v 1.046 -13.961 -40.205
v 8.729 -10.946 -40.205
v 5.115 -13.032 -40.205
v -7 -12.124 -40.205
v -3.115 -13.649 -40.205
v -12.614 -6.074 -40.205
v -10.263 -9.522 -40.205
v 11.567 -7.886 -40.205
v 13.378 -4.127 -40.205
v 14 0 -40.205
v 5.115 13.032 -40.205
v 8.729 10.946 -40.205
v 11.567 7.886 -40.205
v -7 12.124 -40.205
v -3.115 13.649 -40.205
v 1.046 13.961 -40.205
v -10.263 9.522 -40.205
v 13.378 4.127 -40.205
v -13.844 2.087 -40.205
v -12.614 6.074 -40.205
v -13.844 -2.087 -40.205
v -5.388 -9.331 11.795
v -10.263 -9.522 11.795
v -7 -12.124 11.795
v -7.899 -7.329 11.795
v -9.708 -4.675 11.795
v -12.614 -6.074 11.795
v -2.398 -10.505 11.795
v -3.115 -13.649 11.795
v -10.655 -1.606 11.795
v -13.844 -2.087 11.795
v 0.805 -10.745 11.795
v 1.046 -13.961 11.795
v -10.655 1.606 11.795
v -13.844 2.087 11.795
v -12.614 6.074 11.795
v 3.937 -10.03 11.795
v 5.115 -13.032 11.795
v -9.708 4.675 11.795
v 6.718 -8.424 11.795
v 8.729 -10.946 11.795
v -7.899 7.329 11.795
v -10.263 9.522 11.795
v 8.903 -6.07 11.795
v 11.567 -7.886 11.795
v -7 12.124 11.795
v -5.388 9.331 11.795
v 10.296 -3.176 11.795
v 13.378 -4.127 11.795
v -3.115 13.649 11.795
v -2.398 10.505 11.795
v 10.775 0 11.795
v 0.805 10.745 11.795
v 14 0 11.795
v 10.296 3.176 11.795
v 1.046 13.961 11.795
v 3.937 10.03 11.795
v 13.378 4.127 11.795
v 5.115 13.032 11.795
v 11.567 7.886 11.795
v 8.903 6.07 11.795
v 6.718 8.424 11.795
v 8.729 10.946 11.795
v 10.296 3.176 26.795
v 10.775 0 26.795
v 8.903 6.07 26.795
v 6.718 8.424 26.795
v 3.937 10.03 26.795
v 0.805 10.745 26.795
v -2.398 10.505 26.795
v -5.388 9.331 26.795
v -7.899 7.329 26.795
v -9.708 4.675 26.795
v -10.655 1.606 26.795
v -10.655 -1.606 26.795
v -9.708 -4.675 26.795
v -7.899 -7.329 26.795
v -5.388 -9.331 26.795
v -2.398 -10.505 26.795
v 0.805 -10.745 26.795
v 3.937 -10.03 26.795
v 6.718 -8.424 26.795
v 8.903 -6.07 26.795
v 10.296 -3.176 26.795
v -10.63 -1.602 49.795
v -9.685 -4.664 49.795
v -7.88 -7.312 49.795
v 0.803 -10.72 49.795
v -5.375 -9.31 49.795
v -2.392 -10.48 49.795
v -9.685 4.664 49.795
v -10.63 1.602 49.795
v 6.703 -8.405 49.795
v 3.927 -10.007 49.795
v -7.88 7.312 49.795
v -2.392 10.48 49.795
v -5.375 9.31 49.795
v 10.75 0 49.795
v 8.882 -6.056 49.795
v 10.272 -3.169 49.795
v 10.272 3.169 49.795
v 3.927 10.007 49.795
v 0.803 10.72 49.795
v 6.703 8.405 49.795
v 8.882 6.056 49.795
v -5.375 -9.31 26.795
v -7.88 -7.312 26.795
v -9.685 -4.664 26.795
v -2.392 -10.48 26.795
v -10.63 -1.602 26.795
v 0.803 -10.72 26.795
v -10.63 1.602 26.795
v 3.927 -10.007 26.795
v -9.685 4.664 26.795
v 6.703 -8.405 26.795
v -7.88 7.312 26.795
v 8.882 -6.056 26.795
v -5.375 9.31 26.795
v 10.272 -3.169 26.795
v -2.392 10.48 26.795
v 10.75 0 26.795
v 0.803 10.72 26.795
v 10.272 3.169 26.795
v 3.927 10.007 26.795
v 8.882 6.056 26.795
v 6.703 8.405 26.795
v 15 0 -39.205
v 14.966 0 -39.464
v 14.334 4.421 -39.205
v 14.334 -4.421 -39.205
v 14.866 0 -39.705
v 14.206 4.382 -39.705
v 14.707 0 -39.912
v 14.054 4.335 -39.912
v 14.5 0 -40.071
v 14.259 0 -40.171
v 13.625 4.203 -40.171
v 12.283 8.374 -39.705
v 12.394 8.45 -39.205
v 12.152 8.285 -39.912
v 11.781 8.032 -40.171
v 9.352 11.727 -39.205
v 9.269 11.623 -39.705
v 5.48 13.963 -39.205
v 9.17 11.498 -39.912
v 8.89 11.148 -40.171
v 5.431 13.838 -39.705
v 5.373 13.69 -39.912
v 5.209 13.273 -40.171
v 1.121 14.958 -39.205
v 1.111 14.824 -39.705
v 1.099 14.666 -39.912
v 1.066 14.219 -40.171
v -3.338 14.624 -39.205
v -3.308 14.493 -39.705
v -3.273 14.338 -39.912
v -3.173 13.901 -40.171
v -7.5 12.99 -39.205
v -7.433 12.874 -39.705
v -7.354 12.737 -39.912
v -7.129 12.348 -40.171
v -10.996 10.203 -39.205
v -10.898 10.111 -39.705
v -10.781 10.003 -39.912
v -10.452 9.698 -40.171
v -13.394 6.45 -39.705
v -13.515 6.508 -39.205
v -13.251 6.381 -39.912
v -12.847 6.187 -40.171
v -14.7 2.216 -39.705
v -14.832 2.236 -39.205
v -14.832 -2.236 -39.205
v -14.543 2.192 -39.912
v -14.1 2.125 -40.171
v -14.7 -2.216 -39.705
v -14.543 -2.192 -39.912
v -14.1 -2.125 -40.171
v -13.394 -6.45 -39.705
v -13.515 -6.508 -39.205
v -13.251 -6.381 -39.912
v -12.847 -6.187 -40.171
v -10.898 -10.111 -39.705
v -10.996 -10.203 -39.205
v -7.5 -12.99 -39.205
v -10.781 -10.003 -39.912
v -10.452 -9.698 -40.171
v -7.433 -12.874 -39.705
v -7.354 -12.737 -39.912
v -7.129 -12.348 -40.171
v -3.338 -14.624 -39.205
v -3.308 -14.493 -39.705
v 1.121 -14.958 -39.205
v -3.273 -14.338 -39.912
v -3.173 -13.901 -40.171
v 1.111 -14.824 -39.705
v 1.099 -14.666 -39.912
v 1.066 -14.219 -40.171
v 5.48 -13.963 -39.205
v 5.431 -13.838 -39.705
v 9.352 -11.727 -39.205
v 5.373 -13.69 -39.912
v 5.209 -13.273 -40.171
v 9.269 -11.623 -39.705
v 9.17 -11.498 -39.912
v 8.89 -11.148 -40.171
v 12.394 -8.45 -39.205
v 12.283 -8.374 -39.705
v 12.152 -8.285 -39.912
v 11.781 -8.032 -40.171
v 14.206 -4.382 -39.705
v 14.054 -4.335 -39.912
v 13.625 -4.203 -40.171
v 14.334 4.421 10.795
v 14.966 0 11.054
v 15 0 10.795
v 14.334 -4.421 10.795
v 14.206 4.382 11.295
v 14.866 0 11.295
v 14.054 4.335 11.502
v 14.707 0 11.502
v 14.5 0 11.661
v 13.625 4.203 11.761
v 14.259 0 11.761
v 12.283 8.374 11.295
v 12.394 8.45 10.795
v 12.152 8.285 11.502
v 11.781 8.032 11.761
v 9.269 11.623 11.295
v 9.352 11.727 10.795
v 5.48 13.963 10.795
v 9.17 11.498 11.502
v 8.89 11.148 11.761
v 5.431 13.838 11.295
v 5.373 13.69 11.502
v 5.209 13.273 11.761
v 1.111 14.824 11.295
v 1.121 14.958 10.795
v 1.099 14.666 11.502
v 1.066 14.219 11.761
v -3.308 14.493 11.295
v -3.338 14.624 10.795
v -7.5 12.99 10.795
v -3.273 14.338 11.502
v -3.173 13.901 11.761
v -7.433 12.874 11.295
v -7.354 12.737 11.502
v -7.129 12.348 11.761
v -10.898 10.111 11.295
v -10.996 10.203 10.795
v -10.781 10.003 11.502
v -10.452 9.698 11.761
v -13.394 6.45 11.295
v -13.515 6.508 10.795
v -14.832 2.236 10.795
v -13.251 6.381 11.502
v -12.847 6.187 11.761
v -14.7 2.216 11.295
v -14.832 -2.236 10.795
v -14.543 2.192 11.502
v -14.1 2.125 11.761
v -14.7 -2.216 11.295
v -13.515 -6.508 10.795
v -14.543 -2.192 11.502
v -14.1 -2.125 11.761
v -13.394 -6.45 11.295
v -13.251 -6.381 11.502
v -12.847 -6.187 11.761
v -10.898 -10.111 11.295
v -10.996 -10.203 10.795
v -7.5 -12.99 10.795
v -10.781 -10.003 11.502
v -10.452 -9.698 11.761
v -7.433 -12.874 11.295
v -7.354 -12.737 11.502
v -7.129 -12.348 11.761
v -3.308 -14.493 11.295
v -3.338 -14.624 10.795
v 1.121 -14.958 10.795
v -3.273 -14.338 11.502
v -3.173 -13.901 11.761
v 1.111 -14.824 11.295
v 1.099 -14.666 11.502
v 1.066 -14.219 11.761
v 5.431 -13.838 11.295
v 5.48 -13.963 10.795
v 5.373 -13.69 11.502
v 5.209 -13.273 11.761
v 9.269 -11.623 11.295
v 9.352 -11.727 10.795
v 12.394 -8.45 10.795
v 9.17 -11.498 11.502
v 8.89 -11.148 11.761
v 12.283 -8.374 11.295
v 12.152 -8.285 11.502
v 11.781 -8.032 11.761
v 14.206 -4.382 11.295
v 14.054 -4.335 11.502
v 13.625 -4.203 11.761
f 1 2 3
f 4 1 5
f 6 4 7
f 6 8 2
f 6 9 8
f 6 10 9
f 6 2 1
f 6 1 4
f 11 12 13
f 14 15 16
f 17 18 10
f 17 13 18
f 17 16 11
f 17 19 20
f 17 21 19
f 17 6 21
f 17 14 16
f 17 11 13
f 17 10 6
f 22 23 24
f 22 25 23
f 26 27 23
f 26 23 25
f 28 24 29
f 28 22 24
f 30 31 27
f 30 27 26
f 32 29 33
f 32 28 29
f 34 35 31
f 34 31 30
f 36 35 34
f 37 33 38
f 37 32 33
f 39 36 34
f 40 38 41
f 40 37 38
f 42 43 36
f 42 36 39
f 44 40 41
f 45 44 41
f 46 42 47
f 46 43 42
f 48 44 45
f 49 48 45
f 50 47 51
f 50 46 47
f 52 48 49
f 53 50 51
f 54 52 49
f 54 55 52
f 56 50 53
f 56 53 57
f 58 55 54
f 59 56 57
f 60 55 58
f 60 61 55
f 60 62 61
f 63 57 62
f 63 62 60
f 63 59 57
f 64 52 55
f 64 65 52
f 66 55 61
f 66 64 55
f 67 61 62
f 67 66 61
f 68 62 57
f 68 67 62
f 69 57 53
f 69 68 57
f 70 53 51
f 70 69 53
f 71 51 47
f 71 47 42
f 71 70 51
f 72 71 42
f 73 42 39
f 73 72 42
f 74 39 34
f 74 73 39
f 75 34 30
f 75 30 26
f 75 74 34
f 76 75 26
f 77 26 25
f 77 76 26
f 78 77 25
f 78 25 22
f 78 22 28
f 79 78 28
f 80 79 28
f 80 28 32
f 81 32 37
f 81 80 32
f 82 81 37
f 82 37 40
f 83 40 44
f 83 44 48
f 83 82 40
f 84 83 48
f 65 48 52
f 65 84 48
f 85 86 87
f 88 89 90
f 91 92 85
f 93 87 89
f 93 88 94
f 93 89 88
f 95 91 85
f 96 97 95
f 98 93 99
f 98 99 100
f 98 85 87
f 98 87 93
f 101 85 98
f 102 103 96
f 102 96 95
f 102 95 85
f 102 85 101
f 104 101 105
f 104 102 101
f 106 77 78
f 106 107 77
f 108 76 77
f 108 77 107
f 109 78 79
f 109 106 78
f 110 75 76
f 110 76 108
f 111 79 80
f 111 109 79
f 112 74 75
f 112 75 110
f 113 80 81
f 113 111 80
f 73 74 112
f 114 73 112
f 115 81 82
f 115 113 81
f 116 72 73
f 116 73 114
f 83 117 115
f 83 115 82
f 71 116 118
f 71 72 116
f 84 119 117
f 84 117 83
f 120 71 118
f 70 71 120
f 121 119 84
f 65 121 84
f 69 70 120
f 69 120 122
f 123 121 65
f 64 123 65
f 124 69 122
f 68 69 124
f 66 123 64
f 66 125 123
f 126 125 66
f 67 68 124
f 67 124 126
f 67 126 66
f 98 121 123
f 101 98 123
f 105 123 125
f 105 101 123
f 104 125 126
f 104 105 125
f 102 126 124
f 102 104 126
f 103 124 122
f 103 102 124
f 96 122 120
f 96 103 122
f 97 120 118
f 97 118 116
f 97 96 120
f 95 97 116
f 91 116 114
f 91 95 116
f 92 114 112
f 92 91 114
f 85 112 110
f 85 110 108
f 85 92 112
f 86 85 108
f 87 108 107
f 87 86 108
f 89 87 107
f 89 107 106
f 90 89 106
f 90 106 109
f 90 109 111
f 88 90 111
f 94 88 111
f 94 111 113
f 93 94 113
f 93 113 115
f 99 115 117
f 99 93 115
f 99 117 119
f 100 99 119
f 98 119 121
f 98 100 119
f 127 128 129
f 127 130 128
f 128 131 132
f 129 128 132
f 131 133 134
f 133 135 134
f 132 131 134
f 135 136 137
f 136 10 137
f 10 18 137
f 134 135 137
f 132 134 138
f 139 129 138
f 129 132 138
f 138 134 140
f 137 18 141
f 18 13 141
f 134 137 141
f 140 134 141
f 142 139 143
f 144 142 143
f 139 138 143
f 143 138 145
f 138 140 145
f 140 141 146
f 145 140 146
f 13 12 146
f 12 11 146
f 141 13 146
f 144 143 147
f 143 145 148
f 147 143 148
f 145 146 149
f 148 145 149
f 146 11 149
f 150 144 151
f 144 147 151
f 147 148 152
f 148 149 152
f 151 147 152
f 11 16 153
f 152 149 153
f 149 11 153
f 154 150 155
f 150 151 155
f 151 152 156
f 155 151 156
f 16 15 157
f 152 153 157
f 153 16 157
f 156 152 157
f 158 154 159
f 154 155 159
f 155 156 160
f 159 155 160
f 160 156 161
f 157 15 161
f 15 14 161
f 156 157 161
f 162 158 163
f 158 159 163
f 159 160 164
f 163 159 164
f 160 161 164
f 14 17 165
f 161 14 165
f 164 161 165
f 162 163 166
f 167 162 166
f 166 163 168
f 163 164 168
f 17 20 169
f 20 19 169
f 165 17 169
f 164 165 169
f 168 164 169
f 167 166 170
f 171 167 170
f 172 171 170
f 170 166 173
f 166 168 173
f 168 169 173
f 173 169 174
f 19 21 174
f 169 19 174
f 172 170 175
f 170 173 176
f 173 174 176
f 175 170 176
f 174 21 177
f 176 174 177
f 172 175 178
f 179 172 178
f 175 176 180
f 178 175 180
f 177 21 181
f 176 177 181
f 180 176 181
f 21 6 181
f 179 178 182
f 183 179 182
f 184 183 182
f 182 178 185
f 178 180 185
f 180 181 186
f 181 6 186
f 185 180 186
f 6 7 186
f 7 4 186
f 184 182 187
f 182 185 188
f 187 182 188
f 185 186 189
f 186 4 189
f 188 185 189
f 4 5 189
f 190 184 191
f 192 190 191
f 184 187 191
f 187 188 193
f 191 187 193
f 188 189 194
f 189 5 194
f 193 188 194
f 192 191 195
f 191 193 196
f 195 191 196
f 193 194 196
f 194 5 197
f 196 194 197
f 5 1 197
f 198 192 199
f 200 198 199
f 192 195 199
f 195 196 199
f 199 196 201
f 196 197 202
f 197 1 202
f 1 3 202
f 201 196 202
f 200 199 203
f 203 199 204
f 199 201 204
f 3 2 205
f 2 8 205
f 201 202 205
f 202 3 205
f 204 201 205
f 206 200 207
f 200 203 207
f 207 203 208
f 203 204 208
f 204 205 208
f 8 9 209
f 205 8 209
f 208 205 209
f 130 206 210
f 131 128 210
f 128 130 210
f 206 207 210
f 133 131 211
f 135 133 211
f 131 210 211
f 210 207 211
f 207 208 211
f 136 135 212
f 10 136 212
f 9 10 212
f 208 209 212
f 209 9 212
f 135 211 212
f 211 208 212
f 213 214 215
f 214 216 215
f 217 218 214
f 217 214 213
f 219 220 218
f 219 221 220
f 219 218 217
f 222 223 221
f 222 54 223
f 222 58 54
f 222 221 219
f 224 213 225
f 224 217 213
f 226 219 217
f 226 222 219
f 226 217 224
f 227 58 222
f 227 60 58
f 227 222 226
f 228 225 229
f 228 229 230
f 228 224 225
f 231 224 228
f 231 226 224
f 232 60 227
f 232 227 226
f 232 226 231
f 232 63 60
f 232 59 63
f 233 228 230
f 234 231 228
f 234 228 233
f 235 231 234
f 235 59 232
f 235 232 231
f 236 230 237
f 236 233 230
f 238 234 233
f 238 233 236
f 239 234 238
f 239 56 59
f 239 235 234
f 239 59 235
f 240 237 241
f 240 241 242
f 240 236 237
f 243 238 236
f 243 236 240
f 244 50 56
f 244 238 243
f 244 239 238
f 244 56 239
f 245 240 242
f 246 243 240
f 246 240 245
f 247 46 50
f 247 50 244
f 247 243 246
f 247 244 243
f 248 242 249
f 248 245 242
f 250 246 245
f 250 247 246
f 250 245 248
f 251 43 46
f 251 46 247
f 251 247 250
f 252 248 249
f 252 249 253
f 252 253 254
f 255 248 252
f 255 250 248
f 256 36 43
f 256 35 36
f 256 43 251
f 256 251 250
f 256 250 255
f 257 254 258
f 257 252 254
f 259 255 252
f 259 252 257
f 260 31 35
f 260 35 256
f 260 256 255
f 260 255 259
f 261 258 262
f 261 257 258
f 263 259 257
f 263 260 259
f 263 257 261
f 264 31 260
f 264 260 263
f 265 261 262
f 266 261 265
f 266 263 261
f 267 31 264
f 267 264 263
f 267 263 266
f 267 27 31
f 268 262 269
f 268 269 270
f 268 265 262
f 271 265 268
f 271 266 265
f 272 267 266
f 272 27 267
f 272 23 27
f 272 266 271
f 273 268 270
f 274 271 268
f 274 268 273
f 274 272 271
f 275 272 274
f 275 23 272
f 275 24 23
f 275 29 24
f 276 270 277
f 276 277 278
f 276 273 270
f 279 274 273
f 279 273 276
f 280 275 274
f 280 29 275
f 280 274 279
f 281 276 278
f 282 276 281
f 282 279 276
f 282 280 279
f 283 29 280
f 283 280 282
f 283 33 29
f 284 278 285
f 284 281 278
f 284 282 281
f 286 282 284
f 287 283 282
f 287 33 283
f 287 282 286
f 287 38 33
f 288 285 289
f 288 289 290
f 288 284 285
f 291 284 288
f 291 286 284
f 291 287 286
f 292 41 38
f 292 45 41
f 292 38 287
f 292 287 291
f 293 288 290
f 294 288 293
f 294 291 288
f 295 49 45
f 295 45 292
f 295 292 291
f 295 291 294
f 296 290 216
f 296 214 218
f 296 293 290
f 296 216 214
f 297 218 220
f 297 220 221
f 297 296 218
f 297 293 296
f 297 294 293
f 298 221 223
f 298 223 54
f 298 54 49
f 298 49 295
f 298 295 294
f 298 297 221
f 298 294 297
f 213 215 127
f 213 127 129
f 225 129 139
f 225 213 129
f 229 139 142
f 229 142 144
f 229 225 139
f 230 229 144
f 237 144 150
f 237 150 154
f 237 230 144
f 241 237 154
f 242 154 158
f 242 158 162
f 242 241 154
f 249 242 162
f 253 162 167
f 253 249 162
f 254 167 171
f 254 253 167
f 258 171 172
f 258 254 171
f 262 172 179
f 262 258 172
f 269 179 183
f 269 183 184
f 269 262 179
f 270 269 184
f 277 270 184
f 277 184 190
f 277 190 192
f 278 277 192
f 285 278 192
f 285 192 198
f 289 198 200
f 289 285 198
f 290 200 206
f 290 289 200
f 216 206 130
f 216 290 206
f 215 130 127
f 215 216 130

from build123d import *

# Parameters (mm, degrees)
F2_R = 1
F3_R = 1


with BuildPart() as f1:
    # F0 (on Front) → F1 (revolve)
    with BuildSketch(Plane.XZ):
        Polygon((10.75, 49.795319), (0, 49.795319), (0, 11.795319), (0, -40.204681), (15, -40.204681), (15, 11.795319), (10.775, 11.795319), (10.775, 26.795319), (10.75, 26.795319), align=None)
    revolve(axis=Axis((0, 0, 30.795319), (0, 0, 1)))

    # F2
    f2_edges = [f1.edges().sort_by_distance(p)[0] for p in [
        (-15, 0, 11.795319),
    ]]
    fillet(f2_edges, radius=F2_R)

    # F3
    f3_edges = [f1.edges().sort_by_distance(p)[0] for p in [
        (-15, 0, -40.204681),
    ]]
    fillet(f3_edges, radius=F3_R)


solid = f1.part
